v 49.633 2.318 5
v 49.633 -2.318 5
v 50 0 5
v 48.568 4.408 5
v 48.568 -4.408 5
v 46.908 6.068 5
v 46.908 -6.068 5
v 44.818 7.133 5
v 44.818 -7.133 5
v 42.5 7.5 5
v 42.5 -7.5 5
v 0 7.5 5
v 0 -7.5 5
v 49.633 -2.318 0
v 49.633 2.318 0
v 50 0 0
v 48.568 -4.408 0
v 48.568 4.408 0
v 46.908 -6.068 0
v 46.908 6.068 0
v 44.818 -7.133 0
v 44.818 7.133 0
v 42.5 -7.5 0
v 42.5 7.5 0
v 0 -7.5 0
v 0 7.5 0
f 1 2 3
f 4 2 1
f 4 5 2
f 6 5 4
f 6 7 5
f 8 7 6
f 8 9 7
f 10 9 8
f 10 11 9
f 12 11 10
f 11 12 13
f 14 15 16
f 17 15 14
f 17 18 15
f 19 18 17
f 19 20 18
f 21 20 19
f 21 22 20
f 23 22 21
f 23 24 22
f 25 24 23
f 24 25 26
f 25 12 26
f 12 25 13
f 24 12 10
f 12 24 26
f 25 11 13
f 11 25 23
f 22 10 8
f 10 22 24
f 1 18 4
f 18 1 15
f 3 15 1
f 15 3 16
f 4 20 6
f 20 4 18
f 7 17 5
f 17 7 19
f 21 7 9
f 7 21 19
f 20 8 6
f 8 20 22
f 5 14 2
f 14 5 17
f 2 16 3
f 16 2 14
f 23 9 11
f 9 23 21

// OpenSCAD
// file: Library/center.scad
module center(axis){
	translate((axis / -2.0)){
		children();
	}
}
// file: CylinderDispenser_Dispenser_Virgin_Hearth_Outer_Lip.scad
radius = 24.0;
height = 5.0;

/* [OpenSCAD] [Quality] */
$fn = 20;

module CylinderDispenser_Dispenser_Virgin_Hearth_Outer_Lip(diameter, height){
		cylinder(d=diameter, h=height);
}

CylinderDispenser_Dispenser_Virgin_Hearth_Outer_Lip(radius, height);
// file: CylinderDispenser_Dispenser_Virgin_Hearth_Outer_Walkway.scad
use <Library/center.scad>

//Length, width, height.
dimensions = [50, 24, 5];

module CylinderDispenser_Dispenser_Virgin_Hearth_Outer_Walkway(dimensions){
	center([0, dimensions[1], 0]){
		cube(dimensions);
	}
}

CylinderDispenser_Dispenser_Virgin_Hearth_Outer_Walkway(dimensions);
// main file
use <CylinderDispenser_Dispenser_Virgin_Hearth_Outer_Walkway.scad>
use <CylinderDispenser_Dispenser_Virgin_Hearth_Outer_Lip.scad>

//Length, width, height. The length is from the start of the the walkway to the end of the lip. The width can be though of as the diameter of the lip.
dimensions = [50, 15, 5];

/* [OpenSCAD] [Quality] */
$fn = 20;

module CylinderDispenser_Dispenser_Virgin_Hearth_Outer(dimensions){
	diameter = dimensions.y;
	radius = diameter / 2.0;
	walkwayLength = dimensions.x - radius;
	union(){
		CylinderDispenser_Dispenser_Virgin_Hearth_Outer_Walkway([walkwayLength, dimensions.y, dimensions.z]);
		translate([walkwayLength, 0, 0]){
			CylinderDispenser_Dispenser_Virgin_Hearth_Outer_Lip(diameter, dimensions.z);
		}
	}
}

CylinderDispenser_Dispenser_Virgin_Hearth_Outer(dimensions);
